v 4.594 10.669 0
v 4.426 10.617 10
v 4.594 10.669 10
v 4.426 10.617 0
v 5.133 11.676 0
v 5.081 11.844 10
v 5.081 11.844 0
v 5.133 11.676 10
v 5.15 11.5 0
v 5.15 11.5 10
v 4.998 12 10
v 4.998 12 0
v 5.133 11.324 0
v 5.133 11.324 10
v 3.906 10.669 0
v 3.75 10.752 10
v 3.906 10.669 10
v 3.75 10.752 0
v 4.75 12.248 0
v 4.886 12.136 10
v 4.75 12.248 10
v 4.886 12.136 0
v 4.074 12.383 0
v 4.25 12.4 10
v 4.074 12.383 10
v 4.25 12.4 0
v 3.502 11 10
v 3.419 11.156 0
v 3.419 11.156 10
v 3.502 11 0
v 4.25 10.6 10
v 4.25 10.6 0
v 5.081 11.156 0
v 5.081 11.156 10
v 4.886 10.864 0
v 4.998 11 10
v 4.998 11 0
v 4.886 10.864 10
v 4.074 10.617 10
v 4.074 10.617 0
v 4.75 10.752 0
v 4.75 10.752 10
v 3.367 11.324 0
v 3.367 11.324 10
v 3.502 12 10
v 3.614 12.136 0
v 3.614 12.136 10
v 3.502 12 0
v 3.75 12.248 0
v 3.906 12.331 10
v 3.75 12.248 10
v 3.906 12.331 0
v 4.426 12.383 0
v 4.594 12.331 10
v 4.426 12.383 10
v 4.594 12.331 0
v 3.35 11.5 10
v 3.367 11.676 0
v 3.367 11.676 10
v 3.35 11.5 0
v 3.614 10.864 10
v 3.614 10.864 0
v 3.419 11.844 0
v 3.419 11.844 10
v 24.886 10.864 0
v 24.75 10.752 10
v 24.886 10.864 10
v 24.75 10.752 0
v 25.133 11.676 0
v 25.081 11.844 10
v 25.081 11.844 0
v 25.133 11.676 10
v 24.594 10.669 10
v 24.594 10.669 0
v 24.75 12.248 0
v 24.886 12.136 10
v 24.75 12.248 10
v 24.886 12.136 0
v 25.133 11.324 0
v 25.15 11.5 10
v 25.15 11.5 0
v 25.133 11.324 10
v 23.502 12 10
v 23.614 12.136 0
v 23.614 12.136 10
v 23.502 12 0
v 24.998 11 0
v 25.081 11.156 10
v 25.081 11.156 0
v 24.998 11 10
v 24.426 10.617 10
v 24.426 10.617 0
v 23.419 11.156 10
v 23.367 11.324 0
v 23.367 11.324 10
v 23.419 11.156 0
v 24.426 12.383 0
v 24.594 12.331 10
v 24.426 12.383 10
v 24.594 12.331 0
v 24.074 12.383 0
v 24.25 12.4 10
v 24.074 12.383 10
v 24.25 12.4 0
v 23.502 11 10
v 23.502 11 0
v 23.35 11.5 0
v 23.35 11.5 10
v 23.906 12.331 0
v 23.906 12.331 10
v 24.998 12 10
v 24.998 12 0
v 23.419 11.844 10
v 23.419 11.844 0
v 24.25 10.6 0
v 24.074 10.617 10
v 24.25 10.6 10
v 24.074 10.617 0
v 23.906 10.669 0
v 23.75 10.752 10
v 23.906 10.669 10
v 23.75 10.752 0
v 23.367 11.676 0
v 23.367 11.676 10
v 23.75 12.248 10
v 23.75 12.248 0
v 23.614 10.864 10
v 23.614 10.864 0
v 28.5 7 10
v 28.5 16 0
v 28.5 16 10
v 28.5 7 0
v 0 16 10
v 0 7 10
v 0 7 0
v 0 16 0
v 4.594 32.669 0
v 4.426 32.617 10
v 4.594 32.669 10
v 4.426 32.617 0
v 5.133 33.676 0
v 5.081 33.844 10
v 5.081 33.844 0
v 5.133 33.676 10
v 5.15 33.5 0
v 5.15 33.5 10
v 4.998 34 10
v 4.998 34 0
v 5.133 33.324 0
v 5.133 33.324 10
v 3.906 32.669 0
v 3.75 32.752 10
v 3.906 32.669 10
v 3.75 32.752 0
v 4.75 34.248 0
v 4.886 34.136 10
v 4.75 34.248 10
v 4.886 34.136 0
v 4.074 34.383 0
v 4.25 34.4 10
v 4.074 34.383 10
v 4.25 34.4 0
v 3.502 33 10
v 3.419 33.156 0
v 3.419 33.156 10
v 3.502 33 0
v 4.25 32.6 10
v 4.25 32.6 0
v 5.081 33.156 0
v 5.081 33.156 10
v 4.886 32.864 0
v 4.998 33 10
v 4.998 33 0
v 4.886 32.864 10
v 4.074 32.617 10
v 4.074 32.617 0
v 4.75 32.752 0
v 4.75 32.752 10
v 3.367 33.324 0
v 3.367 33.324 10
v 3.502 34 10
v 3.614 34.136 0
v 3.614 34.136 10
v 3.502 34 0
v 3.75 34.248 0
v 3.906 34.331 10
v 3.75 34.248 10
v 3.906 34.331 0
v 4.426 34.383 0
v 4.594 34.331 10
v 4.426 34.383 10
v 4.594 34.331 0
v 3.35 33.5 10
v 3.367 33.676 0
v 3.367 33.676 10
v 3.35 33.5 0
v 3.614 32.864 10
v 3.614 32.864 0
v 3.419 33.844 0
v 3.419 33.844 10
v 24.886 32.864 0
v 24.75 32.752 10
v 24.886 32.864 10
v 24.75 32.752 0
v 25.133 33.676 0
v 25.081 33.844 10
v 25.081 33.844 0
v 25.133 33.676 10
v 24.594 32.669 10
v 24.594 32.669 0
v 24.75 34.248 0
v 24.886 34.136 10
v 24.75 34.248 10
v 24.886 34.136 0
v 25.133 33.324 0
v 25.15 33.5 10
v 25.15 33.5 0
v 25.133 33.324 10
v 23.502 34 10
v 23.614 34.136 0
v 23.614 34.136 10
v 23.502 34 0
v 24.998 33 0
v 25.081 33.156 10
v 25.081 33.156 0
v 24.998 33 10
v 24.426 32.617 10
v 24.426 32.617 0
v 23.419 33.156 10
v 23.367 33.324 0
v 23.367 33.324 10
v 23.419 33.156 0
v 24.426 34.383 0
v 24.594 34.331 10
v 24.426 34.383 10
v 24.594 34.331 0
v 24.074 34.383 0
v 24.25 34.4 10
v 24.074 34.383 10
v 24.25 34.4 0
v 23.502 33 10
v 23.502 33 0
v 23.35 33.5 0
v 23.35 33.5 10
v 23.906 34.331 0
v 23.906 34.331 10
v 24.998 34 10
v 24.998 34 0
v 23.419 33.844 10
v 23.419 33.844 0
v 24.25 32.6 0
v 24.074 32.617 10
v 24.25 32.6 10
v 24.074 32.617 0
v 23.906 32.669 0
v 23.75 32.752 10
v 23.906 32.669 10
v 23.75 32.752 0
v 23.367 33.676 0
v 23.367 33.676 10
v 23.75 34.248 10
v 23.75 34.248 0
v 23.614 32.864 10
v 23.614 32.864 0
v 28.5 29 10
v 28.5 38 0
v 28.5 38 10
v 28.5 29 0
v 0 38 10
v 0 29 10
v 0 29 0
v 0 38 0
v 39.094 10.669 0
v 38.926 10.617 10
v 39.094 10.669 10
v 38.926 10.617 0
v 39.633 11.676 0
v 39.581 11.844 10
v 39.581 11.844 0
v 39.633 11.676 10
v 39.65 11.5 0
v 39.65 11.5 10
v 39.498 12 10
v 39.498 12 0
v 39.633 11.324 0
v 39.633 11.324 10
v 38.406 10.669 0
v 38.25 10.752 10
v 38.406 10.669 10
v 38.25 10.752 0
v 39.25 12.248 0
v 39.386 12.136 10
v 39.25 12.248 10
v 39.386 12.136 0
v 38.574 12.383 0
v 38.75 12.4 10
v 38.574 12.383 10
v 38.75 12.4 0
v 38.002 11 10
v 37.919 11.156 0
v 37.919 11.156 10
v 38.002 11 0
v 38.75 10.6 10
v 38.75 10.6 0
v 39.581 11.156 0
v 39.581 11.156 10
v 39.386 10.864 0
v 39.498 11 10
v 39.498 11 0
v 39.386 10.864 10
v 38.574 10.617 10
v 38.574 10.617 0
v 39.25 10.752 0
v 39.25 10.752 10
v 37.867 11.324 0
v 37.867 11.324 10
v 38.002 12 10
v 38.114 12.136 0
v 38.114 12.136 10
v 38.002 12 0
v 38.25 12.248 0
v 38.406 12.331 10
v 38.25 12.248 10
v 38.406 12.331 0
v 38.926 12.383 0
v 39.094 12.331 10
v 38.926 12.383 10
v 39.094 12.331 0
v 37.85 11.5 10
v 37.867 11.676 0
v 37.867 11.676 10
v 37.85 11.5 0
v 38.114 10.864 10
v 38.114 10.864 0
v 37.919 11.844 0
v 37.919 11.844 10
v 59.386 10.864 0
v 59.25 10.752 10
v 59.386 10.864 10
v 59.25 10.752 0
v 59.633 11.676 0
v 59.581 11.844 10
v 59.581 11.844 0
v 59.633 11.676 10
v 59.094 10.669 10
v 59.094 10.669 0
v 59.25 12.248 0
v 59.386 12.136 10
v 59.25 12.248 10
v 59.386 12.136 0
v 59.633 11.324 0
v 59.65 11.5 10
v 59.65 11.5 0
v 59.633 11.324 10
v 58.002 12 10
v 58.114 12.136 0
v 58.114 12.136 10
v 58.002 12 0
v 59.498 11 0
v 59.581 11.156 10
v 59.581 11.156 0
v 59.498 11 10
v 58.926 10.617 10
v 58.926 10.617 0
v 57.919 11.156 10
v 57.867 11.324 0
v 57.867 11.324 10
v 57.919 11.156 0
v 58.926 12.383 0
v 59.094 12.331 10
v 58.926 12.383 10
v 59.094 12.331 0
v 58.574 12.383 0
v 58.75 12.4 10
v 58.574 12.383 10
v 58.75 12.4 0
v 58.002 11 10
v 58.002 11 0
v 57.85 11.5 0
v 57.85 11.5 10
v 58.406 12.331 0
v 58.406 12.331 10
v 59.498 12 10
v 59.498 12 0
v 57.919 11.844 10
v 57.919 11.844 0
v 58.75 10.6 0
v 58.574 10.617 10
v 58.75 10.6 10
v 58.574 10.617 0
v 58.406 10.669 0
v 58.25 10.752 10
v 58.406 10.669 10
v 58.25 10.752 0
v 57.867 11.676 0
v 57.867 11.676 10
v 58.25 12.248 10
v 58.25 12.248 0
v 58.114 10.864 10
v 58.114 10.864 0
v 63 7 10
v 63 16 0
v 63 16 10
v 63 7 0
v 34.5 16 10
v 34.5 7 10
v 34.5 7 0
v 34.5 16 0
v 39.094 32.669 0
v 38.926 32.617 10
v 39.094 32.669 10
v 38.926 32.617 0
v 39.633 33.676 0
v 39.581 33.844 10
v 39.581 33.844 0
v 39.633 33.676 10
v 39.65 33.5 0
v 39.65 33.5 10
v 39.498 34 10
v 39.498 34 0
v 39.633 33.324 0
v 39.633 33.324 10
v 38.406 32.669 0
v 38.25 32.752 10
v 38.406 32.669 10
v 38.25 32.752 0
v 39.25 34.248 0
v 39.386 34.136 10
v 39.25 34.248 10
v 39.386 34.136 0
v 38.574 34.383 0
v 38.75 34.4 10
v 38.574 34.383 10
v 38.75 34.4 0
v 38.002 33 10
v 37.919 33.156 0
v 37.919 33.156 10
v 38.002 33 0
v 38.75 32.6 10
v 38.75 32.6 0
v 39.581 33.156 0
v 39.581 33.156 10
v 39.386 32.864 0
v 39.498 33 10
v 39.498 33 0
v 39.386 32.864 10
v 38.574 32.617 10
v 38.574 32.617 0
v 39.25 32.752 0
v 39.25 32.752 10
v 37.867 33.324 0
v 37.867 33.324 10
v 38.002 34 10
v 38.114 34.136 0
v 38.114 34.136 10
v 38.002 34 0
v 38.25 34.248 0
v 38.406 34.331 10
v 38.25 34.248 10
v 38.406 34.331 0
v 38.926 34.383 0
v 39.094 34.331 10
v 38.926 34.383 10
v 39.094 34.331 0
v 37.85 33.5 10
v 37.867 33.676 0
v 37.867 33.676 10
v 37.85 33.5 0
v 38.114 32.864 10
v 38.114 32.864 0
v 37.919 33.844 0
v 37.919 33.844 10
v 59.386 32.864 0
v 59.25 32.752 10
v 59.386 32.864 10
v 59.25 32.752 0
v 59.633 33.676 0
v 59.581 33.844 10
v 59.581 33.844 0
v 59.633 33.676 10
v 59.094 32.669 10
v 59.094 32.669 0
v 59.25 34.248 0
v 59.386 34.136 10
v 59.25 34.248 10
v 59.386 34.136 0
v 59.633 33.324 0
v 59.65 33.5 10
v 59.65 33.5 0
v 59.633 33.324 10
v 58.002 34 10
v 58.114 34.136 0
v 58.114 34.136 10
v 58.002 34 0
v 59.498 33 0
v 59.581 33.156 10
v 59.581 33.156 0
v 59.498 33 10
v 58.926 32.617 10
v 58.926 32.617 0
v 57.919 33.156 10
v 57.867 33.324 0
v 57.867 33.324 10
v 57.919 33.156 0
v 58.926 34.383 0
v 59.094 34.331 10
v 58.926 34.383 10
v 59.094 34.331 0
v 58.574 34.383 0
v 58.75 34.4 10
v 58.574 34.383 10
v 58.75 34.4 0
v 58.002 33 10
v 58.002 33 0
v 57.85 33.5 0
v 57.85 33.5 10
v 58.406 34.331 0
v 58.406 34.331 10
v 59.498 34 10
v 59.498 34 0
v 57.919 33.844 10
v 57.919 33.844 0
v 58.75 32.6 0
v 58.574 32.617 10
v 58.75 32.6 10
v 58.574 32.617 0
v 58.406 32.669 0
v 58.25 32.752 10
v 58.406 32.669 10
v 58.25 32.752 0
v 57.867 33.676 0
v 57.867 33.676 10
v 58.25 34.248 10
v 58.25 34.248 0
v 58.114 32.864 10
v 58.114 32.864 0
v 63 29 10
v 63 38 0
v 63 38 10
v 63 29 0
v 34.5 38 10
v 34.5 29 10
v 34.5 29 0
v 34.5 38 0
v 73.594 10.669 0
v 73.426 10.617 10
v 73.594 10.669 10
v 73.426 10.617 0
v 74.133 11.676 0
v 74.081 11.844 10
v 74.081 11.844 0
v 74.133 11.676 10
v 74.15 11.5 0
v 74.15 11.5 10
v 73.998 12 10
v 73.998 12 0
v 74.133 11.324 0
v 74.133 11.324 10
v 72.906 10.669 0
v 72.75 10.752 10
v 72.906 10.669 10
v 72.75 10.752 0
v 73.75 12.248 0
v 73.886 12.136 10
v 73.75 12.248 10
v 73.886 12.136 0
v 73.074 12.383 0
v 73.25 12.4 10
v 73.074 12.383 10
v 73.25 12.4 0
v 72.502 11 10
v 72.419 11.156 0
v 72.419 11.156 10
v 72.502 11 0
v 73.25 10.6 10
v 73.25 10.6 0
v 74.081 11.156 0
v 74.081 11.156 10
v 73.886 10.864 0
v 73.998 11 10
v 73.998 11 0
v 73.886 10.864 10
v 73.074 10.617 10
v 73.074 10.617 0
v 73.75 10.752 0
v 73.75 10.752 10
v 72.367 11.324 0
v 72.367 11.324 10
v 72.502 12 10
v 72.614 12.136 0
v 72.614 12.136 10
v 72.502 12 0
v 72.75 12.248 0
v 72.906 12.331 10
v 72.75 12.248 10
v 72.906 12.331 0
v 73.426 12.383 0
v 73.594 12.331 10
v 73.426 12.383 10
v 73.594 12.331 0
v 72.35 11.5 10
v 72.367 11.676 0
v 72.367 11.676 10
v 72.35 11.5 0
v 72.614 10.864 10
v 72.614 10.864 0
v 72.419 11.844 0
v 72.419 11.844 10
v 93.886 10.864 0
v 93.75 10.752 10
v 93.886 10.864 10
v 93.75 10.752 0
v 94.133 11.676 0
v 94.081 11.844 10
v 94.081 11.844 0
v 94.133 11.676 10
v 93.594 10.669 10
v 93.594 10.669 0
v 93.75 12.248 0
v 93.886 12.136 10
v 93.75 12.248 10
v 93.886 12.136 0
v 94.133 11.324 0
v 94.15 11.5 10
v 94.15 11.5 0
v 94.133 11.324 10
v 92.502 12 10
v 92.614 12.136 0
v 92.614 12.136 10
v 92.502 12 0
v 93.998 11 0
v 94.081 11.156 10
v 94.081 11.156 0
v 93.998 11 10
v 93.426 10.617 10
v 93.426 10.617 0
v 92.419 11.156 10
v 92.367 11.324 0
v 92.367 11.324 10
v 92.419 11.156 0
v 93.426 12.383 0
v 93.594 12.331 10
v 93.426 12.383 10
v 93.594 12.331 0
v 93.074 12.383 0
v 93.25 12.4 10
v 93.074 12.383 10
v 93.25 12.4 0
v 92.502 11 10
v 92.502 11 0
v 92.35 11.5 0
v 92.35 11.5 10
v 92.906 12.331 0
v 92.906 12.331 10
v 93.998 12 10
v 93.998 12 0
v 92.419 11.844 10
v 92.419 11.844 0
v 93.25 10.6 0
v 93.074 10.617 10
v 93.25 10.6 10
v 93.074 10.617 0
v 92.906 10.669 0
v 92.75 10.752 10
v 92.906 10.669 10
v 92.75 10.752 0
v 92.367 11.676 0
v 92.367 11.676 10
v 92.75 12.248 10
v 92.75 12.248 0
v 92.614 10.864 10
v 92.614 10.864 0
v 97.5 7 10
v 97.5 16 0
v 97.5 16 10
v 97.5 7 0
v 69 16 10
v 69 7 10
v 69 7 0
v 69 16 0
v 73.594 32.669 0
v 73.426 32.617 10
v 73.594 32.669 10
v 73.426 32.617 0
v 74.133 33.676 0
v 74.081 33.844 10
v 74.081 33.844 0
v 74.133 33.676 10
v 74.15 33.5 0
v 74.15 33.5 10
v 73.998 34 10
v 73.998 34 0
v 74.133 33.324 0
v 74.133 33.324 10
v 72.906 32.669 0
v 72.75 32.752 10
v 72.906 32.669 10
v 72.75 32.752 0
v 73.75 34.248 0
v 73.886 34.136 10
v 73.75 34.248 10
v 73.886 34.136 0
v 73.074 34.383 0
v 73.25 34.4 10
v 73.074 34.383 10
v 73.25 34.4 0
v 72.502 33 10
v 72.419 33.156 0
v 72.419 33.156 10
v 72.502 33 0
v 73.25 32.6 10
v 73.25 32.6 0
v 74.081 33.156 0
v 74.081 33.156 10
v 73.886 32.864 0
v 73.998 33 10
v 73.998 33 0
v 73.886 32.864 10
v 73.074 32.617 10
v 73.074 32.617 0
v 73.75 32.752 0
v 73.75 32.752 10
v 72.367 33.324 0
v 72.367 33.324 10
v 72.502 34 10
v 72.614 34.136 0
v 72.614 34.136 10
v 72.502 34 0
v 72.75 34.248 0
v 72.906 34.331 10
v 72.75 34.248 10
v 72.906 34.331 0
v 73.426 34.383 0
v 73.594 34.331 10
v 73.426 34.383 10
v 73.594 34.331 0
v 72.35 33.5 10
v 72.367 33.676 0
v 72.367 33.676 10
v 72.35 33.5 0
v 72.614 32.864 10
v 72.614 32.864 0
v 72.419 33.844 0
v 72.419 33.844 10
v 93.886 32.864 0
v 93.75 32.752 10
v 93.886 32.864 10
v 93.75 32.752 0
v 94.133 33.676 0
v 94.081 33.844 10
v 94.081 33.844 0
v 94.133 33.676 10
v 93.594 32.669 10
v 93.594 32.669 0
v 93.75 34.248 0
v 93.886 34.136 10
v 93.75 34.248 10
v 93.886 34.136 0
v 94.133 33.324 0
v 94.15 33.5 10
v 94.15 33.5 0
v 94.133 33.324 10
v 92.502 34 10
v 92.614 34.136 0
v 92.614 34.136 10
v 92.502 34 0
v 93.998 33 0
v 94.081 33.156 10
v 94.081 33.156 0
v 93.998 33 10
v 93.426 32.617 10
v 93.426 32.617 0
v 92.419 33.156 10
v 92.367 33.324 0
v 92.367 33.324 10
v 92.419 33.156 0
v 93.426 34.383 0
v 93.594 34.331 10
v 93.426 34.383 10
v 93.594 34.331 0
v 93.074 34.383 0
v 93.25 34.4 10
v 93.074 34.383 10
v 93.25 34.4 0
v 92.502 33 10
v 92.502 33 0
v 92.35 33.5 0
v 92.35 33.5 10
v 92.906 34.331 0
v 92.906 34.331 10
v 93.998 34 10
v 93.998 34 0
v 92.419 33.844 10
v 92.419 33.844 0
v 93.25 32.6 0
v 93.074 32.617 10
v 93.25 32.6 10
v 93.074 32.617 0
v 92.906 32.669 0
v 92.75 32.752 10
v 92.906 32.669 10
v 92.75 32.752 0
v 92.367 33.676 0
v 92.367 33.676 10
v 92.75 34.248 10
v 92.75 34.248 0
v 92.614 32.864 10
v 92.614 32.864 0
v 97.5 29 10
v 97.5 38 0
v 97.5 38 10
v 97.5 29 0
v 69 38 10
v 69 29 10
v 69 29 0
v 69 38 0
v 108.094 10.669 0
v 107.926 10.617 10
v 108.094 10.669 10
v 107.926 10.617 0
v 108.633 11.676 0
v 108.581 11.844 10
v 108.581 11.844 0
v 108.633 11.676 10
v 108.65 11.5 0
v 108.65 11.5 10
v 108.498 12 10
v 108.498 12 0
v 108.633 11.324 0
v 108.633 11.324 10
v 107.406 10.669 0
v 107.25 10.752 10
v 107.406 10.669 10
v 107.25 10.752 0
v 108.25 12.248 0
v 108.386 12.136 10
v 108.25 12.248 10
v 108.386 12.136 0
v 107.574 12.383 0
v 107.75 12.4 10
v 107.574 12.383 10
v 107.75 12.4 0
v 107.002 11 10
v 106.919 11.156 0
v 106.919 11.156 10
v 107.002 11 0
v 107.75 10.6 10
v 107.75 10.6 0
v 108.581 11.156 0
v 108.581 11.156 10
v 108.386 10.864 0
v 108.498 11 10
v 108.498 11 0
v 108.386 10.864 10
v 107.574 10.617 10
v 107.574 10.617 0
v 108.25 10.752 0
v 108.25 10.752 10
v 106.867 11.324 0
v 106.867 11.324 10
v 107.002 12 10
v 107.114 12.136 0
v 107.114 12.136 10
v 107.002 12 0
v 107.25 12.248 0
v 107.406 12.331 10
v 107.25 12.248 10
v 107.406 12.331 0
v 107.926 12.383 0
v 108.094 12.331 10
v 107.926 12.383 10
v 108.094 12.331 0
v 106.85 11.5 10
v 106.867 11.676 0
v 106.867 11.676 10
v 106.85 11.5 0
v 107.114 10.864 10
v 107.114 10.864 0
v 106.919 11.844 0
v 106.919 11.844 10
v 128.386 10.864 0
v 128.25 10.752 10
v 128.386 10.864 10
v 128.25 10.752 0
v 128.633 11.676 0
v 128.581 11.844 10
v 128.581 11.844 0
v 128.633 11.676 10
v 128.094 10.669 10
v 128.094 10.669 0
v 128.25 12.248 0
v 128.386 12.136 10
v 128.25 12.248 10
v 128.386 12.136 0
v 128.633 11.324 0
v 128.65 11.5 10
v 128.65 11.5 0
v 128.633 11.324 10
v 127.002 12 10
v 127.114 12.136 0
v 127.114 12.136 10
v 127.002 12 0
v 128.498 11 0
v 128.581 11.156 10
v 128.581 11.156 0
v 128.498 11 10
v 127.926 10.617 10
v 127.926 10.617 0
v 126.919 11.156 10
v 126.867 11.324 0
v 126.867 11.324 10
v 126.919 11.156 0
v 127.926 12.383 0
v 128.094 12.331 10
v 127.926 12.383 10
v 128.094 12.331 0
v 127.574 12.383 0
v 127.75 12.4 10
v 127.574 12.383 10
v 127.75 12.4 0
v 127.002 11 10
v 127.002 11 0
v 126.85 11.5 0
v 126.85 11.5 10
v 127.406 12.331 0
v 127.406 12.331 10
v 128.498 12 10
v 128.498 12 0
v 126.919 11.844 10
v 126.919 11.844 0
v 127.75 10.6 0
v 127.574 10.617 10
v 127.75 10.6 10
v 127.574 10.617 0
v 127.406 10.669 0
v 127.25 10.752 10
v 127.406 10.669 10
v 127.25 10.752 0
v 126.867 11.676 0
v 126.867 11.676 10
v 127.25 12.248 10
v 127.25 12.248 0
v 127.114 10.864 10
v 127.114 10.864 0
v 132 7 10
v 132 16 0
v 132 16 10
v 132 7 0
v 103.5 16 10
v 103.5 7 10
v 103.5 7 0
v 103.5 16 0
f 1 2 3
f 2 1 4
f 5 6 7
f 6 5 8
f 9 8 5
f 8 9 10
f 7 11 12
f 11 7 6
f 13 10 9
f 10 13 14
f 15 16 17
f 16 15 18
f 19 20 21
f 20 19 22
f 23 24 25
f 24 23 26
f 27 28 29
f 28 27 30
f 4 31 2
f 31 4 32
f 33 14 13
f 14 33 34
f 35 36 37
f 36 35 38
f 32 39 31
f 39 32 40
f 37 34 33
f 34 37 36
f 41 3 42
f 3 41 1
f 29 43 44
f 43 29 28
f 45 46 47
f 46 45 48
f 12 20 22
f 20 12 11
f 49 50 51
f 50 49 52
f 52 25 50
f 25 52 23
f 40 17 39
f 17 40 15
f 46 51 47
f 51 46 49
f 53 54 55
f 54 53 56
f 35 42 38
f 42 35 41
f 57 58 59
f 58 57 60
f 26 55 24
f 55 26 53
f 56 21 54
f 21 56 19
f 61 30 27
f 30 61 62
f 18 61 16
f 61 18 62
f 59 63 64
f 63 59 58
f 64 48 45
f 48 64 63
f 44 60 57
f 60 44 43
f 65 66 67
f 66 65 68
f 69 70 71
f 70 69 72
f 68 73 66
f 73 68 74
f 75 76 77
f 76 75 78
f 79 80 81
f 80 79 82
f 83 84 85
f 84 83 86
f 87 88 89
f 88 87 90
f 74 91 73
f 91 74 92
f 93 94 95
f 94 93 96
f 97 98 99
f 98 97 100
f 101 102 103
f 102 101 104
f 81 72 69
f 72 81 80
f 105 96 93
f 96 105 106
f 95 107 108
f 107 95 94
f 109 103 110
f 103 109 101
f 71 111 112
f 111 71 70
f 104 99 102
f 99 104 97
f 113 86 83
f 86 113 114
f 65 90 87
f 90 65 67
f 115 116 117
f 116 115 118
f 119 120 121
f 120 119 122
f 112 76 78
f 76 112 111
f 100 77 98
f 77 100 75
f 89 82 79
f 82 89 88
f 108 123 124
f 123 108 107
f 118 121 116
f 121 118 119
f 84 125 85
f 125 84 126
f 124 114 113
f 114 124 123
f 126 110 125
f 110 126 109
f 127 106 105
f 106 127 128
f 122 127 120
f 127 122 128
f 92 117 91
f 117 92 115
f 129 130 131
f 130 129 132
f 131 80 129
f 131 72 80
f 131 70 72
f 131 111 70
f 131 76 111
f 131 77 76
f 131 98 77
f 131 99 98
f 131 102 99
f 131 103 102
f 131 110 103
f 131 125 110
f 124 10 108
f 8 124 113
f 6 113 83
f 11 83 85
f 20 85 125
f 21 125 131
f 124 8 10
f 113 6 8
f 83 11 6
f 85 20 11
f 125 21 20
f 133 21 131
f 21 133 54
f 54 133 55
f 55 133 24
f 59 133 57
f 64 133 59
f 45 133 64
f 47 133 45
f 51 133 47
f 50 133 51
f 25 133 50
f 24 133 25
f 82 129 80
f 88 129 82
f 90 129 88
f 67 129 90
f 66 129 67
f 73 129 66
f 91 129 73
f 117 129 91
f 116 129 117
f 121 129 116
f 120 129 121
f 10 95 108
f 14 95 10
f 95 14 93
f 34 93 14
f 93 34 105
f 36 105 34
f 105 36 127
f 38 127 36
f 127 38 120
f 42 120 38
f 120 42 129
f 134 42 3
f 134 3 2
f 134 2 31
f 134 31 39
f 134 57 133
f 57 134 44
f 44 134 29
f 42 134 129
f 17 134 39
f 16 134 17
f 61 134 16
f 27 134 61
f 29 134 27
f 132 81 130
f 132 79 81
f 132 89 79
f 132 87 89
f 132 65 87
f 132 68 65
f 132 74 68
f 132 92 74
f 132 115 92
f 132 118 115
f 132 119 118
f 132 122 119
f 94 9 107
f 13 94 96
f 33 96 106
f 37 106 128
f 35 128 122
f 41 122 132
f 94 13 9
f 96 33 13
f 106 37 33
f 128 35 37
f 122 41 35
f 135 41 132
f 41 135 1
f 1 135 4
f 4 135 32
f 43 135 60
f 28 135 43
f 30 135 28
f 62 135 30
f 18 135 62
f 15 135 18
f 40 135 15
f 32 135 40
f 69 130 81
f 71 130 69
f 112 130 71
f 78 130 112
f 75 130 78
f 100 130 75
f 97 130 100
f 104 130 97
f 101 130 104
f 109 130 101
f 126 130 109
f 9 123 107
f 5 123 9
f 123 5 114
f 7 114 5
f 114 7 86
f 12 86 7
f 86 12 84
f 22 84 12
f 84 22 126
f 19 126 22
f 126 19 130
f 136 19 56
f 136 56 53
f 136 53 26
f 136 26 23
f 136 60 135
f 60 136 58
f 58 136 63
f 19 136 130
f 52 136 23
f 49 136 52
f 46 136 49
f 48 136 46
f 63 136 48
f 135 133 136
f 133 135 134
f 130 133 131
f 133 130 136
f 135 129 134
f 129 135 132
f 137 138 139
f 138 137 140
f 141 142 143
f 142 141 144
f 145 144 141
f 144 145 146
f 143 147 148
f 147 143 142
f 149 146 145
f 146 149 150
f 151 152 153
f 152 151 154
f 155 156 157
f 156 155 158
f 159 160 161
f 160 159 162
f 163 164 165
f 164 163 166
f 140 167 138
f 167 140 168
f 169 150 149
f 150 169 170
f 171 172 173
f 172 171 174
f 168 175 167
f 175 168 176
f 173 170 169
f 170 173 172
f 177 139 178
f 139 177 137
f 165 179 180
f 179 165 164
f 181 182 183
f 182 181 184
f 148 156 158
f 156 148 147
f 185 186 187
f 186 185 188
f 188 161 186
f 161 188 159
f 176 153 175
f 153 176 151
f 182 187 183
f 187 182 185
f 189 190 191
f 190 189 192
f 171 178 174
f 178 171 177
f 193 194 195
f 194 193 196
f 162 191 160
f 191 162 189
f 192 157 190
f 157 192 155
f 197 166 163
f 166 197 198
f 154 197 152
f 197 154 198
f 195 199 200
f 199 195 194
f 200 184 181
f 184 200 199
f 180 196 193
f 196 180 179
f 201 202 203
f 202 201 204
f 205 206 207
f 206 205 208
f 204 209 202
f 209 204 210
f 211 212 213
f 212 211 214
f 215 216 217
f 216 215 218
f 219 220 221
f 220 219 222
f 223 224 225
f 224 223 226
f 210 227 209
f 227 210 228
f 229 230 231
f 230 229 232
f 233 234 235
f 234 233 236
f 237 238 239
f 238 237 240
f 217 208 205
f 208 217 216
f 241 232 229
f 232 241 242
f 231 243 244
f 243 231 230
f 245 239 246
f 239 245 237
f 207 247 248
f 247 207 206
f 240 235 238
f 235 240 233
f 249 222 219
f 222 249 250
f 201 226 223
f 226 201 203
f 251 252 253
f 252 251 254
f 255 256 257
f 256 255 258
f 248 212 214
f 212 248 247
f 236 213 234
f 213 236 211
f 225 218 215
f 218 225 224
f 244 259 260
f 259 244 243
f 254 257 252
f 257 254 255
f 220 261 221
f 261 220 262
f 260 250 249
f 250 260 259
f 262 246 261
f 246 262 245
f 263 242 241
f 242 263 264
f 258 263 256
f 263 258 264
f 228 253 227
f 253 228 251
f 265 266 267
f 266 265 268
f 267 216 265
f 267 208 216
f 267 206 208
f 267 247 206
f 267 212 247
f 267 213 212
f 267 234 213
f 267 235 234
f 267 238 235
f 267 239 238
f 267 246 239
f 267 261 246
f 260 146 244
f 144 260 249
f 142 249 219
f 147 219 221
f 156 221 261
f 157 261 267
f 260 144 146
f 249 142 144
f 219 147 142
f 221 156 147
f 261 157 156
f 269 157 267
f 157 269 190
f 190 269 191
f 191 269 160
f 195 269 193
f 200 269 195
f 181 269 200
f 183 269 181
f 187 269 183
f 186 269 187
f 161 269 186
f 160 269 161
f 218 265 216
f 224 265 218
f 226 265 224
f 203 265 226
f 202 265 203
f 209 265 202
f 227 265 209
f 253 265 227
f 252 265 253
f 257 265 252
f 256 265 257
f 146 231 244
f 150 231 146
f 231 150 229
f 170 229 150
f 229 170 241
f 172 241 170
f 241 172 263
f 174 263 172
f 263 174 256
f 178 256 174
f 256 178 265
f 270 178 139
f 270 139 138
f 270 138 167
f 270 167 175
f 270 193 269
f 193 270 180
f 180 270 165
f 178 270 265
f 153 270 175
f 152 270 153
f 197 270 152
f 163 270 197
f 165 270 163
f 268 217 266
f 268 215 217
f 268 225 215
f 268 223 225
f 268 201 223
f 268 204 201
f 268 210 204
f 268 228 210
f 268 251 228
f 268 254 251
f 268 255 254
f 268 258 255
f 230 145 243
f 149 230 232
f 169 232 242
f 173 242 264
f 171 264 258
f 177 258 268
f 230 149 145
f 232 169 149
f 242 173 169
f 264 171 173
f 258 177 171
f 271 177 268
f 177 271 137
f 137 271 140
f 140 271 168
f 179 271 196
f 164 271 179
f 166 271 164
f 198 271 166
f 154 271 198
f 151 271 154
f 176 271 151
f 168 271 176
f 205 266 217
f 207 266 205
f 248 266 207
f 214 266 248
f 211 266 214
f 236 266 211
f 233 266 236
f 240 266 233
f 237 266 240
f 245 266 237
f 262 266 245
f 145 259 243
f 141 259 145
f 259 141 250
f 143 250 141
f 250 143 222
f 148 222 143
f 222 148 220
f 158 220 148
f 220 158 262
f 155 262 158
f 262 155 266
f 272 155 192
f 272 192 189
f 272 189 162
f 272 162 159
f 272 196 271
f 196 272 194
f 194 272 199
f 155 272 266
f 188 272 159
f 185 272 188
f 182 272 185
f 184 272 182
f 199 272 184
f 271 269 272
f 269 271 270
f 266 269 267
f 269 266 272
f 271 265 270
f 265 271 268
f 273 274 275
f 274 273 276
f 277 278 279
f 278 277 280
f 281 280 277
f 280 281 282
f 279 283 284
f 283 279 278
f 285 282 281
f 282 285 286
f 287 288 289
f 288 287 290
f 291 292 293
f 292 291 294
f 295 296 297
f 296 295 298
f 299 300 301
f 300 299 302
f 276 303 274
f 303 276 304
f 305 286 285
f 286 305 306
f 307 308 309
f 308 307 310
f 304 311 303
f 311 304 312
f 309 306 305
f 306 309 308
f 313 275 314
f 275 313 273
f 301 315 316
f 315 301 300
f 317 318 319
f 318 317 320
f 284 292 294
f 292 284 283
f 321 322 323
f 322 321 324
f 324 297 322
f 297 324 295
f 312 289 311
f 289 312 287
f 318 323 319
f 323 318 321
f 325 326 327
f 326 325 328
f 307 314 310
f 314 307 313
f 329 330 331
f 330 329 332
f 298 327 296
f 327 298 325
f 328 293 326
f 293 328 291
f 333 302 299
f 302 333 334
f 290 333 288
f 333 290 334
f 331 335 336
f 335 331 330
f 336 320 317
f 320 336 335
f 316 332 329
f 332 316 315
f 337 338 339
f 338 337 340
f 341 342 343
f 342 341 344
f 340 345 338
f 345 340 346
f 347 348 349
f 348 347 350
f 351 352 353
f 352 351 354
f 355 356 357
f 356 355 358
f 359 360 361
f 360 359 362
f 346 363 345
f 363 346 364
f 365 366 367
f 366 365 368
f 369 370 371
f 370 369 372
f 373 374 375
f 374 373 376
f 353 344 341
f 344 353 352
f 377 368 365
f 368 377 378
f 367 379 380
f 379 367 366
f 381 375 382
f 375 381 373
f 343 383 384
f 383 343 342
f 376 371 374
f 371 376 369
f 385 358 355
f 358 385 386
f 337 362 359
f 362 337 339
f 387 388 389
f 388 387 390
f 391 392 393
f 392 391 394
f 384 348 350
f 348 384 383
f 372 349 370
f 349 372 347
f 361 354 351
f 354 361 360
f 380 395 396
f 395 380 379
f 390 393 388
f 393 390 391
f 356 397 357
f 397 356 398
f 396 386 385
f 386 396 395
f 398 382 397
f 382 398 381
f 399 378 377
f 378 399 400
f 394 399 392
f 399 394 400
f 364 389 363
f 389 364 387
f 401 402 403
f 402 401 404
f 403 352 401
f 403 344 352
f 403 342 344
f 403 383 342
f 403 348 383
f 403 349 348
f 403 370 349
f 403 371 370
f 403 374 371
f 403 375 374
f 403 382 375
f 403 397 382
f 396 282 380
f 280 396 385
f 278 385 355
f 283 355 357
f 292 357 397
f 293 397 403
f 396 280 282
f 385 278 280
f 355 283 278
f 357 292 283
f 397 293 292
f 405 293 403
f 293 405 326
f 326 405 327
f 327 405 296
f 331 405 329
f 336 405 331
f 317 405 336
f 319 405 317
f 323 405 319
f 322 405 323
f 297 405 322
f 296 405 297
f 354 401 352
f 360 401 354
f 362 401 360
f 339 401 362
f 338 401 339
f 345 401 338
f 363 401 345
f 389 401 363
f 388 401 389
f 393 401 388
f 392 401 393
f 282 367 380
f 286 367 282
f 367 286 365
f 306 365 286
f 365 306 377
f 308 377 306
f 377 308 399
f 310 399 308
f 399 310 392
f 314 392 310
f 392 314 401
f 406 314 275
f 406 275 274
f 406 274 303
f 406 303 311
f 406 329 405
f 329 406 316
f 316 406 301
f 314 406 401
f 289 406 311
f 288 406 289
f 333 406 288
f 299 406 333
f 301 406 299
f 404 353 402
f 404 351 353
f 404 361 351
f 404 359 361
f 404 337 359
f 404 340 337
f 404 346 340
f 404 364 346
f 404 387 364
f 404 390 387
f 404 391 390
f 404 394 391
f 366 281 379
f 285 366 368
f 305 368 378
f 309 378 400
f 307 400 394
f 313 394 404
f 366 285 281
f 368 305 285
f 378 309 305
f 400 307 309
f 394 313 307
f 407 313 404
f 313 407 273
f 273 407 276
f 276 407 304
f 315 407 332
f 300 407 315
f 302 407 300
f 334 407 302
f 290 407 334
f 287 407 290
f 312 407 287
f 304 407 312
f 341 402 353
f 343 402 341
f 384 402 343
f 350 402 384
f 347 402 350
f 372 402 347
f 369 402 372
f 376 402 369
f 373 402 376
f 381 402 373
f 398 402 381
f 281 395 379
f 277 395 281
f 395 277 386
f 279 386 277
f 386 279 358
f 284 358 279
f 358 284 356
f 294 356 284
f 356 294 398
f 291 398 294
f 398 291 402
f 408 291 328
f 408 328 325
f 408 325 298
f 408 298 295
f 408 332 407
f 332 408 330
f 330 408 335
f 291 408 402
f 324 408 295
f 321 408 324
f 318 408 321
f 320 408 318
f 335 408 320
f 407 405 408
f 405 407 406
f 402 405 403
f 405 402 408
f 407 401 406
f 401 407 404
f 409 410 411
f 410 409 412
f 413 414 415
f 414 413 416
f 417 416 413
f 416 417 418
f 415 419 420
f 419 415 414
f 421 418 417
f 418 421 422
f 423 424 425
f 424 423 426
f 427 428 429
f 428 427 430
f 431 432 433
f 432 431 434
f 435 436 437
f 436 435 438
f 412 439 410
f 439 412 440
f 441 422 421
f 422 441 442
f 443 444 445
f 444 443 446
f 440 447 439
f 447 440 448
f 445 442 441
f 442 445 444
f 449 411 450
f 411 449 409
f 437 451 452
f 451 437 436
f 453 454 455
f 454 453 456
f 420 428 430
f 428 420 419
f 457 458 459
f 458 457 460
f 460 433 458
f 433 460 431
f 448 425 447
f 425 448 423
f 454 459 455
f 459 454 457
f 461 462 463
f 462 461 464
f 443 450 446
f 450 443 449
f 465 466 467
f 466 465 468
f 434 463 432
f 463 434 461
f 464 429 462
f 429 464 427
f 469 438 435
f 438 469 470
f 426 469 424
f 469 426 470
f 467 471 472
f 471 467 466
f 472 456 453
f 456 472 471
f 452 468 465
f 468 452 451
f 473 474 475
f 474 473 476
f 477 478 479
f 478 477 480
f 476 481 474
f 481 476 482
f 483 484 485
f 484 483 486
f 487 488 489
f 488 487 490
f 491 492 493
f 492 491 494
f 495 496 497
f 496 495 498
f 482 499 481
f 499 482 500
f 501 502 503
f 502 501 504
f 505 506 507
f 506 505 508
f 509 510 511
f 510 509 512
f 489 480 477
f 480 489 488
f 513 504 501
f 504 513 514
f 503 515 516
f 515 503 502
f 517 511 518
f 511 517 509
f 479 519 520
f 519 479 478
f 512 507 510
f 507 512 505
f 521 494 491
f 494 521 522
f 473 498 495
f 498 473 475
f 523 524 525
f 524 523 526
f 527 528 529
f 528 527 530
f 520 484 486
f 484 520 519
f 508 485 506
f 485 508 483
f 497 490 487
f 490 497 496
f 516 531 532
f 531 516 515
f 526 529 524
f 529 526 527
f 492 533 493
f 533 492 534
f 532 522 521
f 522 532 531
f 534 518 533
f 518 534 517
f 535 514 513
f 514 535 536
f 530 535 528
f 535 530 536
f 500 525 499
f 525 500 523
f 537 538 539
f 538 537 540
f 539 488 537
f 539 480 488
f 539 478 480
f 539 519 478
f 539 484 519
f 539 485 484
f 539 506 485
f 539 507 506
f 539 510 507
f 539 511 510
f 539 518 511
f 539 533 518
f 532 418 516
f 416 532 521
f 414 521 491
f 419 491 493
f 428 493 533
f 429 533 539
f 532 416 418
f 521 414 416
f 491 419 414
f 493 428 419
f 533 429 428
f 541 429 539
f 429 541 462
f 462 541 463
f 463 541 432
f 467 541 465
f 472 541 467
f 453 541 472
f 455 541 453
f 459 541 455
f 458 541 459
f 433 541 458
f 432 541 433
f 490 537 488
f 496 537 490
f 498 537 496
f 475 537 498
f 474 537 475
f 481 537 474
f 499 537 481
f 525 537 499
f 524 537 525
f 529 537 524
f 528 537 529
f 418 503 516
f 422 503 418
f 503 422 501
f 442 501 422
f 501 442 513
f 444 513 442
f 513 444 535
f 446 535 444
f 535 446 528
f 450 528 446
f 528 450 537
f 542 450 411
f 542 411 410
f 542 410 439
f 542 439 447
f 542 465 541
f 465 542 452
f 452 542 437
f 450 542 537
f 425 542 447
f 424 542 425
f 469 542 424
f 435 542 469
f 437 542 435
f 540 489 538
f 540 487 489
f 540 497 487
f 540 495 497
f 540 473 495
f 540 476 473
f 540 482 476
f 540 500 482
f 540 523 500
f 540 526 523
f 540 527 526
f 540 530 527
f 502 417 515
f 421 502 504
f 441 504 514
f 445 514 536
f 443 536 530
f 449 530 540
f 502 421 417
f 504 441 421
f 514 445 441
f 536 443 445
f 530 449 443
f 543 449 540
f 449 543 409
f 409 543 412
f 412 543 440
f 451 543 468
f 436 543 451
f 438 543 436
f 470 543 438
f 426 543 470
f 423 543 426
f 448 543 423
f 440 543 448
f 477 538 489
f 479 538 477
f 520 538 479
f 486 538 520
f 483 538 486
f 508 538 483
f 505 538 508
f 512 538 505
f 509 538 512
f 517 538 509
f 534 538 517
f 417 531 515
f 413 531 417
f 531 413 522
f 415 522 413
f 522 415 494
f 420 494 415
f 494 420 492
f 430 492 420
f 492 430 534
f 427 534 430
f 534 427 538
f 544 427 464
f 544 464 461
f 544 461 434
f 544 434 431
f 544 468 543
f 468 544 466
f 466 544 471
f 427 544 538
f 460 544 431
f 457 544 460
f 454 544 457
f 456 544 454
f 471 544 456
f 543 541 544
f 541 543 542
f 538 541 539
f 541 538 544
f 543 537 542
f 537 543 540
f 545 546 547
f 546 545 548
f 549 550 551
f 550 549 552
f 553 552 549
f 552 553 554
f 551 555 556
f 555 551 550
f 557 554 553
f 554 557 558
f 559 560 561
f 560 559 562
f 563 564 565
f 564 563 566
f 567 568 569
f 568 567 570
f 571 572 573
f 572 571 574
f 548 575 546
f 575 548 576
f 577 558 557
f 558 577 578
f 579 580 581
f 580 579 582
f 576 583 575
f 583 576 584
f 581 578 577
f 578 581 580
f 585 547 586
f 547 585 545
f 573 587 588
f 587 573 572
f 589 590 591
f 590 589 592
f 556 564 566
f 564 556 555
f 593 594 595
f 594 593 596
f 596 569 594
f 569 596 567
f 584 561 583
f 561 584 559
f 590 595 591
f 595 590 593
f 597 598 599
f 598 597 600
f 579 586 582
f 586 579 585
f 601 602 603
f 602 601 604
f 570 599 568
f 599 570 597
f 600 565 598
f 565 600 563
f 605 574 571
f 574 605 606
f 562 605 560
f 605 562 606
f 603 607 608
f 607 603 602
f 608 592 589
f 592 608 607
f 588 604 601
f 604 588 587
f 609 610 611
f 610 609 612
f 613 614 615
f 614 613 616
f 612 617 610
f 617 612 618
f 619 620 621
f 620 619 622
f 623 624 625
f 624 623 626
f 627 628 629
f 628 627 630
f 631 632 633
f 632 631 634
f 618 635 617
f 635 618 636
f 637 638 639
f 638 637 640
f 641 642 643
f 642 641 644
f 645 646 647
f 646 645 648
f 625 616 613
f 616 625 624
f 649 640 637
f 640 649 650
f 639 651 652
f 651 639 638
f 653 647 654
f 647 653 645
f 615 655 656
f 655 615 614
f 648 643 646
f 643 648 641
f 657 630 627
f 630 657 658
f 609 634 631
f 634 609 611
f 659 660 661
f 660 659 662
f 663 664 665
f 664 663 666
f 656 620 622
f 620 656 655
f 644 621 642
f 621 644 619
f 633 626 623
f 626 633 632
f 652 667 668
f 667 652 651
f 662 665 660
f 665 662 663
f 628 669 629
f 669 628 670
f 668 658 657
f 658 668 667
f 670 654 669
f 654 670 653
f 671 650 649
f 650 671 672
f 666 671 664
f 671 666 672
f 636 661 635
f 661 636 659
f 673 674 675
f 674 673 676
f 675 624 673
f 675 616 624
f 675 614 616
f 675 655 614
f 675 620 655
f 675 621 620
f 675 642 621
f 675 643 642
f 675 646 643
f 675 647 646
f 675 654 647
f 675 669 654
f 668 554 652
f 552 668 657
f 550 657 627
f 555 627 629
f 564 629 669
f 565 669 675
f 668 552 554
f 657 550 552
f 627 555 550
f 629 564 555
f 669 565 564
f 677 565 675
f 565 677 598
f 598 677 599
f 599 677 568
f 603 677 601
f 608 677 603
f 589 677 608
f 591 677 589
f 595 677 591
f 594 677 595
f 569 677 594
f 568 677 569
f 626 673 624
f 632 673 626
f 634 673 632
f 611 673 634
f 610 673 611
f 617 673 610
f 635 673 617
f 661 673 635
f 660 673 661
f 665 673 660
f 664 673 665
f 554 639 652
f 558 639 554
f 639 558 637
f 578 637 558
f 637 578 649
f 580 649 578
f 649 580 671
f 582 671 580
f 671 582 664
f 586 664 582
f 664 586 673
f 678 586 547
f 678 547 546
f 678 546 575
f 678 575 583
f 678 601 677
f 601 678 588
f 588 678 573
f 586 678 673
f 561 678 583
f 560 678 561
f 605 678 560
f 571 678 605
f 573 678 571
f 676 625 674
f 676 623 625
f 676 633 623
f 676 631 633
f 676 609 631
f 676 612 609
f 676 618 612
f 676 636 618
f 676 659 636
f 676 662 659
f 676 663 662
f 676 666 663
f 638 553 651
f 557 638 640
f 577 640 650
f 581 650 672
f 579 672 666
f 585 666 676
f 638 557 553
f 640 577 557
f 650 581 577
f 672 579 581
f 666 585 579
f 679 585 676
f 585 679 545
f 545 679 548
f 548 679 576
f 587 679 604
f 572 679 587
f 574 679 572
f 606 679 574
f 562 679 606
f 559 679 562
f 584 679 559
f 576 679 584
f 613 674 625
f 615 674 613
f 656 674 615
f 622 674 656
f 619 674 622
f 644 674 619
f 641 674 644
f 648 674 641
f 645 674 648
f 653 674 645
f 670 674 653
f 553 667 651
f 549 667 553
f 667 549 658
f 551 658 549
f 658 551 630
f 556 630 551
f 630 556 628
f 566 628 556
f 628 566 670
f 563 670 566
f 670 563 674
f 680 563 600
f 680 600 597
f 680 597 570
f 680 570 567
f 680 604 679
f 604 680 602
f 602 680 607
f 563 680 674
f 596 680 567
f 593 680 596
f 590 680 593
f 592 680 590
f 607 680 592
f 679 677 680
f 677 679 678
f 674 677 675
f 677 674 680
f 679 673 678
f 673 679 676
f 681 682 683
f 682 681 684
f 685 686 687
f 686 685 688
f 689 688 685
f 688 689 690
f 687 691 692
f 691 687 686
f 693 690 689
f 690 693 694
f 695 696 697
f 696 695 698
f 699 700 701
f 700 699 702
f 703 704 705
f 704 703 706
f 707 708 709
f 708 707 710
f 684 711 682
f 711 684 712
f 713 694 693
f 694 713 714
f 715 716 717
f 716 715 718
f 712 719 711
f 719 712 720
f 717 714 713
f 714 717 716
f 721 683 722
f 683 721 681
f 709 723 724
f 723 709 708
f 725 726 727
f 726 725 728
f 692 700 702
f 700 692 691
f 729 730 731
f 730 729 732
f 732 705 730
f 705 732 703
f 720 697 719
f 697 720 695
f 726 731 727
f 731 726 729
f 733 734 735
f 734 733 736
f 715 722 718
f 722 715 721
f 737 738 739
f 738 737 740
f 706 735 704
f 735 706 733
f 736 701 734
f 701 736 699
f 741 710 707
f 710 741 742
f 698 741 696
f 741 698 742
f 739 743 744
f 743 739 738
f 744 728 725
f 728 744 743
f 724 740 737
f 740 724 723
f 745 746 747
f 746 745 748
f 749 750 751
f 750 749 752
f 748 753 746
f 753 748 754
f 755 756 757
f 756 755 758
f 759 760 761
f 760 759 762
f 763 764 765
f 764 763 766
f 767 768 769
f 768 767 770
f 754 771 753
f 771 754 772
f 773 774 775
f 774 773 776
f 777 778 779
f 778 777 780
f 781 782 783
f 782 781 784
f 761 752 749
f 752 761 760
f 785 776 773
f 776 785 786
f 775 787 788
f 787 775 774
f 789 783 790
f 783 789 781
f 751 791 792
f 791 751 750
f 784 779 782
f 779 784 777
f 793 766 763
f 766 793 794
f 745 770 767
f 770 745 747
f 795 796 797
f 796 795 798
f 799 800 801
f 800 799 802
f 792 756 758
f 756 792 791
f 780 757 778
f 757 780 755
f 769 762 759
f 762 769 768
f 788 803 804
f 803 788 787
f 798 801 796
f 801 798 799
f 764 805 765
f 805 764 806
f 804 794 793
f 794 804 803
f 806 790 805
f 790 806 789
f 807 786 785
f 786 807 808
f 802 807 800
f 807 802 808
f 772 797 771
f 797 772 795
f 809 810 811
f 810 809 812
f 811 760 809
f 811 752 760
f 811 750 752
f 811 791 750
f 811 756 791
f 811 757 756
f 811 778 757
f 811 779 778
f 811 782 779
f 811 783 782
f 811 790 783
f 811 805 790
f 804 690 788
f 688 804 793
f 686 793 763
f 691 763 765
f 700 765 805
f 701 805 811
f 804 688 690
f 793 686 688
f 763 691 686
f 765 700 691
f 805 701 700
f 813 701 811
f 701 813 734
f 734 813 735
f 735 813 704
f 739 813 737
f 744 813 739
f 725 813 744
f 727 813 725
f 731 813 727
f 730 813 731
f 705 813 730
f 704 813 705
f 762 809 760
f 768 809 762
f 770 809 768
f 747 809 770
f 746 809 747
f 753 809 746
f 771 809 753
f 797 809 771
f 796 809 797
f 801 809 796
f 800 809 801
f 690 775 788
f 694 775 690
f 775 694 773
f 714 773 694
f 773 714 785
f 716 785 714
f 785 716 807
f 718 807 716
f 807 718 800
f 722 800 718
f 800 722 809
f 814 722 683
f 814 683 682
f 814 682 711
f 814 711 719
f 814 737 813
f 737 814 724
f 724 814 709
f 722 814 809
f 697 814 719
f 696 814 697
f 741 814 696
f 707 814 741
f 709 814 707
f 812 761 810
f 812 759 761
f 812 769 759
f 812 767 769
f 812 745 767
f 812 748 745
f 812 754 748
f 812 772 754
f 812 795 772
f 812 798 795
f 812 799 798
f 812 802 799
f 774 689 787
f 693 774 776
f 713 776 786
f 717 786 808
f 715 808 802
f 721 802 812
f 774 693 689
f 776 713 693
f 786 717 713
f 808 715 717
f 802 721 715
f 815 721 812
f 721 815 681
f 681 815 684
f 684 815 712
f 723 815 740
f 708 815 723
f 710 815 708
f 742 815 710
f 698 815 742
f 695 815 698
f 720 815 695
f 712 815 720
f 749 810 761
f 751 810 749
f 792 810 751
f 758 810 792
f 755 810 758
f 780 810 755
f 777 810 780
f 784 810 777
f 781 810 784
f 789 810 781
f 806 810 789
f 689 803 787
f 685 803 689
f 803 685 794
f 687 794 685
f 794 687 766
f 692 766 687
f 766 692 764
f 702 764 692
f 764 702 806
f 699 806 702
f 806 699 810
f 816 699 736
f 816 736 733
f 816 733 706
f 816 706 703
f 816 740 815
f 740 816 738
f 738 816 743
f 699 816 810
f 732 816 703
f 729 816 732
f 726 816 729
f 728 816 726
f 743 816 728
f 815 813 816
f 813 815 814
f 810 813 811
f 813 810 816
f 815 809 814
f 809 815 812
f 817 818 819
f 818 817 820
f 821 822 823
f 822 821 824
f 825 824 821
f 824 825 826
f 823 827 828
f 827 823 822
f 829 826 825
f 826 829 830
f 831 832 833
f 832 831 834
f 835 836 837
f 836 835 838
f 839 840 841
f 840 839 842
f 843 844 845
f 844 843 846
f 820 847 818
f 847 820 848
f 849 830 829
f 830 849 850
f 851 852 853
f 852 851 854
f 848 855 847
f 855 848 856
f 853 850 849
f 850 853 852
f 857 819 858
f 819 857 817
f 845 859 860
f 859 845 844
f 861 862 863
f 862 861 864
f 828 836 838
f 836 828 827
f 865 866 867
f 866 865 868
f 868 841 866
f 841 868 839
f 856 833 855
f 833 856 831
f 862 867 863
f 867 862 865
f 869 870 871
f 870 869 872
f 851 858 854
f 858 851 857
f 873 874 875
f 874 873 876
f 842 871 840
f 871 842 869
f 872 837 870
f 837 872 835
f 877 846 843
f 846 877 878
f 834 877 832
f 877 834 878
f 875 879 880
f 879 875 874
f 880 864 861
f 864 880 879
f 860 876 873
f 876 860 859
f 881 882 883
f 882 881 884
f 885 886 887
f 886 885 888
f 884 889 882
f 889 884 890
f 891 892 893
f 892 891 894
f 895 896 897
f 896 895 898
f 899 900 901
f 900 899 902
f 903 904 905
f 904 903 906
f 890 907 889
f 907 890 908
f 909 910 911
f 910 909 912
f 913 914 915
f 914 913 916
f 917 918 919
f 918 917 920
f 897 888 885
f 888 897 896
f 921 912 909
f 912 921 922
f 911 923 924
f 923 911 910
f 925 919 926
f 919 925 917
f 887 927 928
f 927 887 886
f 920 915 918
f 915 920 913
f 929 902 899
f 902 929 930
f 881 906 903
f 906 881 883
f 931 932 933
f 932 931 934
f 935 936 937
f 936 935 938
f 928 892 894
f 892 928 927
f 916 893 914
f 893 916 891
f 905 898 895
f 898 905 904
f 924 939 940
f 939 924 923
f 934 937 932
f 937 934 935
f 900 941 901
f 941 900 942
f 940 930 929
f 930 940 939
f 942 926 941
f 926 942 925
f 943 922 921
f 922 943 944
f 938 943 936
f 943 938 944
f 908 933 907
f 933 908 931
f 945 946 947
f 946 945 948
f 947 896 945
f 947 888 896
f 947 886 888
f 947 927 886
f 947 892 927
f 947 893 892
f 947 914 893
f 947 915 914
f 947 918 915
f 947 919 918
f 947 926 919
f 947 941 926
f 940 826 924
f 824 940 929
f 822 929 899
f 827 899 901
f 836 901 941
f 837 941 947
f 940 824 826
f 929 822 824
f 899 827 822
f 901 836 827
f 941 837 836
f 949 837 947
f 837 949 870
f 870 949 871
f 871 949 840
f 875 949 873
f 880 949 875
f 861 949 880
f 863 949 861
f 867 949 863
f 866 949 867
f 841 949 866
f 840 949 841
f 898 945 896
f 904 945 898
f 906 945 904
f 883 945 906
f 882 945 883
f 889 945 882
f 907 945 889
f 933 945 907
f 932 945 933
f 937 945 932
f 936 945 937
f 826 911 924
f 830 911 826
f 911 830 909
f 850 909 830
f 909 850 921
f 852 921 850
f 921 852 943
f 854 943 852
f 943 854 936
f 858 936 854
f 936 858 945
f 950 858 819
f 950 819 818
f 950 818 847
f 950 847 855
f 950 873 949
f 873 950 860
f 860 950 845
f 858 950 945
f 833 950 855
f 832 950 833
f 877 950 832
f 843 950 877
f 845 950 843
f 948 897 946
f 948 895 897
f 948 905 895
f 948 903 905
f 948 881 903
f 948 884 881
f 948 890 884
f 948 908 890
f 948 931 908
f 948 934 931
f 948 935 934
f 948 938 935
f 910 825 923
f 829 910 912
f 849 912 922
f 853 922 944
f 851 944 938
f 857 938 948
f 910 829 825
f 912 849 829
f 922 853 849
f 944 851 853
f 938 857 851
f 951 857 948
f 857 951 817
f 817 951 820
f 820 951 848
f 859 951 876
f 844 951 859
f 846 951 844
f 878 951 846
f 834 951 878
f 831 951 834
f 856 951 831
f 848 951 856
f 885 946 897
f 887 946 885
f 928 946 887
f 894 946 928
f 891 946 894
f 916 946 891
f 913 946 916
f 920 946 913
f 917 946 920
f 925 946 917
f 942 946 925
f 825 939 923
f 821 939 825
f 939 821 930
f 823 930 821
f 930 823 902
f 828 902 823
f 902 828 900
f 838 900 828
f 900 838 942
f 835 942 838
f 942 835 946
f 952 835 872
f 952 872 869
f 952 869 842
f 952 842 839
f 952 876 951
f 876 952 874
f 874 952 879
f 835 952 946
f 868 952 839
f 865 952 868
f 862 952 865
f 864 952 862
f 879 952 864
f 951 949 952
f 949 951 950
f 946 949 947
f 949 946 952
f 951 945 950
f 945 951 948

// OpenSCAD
// ARC Scan - 센서 스페이서 (헤더 핀 간섭 해결)
// 보드 뒷면과 마스트 장착면 사이에 끼움. 헤더 핀 줄이 지나는 자리에 골.
// 조립: 센서 → M2로 스페이서에 고정 (스페이서 파일럿에 태핑),
//       스페이서 뒷면 → 마스트 장착면에 글루건 접착

$fn = 32;

// 마스트와 동일 실측값
sens_hole_span = 20.0;
sens_board_len = 24.5;
sens_board_wid = 10.0;

spacer_t   = 10;    // 두께 (헤더 핀 길이보다 크게)
pad        = 4;     // 보드보다 큰 여유
chan_w     = 7;     // 헤더 골 폭
pilot_d    = 1.8;   // M2 태핑 파일럿

w = sens_board_len + pad;   // 28.5
h = sens_board_wid + 6;     // 16 (장착면과 동일)

// 7개 한 판에
for (ix = [0:3]) for (iy = [0:1]) {
  n = ix + iy*4;
  if (n < 7)
    translate([ix*(w+6), iy*(h+6), 0])
    difference() {
      cube([w, h, spacer_t]);
      // 헤더 골: 아래쪽 긴 변을 따라 관통
      translate([-1, -1, -1]) cube([w+2, chan_w+1, spacer_t+2]);
      // 파일럿 구멍 2개 (보드 구멍 위치 = 세로 중앙 기준)
      for (s = [-1, 1])
        translate([w/2 + s*sens_hole_span/2, chan_w + (h-chan_w)/2, -1])
          cylinder(d = pilot_d, h = spacer_t+2);
    }
}
